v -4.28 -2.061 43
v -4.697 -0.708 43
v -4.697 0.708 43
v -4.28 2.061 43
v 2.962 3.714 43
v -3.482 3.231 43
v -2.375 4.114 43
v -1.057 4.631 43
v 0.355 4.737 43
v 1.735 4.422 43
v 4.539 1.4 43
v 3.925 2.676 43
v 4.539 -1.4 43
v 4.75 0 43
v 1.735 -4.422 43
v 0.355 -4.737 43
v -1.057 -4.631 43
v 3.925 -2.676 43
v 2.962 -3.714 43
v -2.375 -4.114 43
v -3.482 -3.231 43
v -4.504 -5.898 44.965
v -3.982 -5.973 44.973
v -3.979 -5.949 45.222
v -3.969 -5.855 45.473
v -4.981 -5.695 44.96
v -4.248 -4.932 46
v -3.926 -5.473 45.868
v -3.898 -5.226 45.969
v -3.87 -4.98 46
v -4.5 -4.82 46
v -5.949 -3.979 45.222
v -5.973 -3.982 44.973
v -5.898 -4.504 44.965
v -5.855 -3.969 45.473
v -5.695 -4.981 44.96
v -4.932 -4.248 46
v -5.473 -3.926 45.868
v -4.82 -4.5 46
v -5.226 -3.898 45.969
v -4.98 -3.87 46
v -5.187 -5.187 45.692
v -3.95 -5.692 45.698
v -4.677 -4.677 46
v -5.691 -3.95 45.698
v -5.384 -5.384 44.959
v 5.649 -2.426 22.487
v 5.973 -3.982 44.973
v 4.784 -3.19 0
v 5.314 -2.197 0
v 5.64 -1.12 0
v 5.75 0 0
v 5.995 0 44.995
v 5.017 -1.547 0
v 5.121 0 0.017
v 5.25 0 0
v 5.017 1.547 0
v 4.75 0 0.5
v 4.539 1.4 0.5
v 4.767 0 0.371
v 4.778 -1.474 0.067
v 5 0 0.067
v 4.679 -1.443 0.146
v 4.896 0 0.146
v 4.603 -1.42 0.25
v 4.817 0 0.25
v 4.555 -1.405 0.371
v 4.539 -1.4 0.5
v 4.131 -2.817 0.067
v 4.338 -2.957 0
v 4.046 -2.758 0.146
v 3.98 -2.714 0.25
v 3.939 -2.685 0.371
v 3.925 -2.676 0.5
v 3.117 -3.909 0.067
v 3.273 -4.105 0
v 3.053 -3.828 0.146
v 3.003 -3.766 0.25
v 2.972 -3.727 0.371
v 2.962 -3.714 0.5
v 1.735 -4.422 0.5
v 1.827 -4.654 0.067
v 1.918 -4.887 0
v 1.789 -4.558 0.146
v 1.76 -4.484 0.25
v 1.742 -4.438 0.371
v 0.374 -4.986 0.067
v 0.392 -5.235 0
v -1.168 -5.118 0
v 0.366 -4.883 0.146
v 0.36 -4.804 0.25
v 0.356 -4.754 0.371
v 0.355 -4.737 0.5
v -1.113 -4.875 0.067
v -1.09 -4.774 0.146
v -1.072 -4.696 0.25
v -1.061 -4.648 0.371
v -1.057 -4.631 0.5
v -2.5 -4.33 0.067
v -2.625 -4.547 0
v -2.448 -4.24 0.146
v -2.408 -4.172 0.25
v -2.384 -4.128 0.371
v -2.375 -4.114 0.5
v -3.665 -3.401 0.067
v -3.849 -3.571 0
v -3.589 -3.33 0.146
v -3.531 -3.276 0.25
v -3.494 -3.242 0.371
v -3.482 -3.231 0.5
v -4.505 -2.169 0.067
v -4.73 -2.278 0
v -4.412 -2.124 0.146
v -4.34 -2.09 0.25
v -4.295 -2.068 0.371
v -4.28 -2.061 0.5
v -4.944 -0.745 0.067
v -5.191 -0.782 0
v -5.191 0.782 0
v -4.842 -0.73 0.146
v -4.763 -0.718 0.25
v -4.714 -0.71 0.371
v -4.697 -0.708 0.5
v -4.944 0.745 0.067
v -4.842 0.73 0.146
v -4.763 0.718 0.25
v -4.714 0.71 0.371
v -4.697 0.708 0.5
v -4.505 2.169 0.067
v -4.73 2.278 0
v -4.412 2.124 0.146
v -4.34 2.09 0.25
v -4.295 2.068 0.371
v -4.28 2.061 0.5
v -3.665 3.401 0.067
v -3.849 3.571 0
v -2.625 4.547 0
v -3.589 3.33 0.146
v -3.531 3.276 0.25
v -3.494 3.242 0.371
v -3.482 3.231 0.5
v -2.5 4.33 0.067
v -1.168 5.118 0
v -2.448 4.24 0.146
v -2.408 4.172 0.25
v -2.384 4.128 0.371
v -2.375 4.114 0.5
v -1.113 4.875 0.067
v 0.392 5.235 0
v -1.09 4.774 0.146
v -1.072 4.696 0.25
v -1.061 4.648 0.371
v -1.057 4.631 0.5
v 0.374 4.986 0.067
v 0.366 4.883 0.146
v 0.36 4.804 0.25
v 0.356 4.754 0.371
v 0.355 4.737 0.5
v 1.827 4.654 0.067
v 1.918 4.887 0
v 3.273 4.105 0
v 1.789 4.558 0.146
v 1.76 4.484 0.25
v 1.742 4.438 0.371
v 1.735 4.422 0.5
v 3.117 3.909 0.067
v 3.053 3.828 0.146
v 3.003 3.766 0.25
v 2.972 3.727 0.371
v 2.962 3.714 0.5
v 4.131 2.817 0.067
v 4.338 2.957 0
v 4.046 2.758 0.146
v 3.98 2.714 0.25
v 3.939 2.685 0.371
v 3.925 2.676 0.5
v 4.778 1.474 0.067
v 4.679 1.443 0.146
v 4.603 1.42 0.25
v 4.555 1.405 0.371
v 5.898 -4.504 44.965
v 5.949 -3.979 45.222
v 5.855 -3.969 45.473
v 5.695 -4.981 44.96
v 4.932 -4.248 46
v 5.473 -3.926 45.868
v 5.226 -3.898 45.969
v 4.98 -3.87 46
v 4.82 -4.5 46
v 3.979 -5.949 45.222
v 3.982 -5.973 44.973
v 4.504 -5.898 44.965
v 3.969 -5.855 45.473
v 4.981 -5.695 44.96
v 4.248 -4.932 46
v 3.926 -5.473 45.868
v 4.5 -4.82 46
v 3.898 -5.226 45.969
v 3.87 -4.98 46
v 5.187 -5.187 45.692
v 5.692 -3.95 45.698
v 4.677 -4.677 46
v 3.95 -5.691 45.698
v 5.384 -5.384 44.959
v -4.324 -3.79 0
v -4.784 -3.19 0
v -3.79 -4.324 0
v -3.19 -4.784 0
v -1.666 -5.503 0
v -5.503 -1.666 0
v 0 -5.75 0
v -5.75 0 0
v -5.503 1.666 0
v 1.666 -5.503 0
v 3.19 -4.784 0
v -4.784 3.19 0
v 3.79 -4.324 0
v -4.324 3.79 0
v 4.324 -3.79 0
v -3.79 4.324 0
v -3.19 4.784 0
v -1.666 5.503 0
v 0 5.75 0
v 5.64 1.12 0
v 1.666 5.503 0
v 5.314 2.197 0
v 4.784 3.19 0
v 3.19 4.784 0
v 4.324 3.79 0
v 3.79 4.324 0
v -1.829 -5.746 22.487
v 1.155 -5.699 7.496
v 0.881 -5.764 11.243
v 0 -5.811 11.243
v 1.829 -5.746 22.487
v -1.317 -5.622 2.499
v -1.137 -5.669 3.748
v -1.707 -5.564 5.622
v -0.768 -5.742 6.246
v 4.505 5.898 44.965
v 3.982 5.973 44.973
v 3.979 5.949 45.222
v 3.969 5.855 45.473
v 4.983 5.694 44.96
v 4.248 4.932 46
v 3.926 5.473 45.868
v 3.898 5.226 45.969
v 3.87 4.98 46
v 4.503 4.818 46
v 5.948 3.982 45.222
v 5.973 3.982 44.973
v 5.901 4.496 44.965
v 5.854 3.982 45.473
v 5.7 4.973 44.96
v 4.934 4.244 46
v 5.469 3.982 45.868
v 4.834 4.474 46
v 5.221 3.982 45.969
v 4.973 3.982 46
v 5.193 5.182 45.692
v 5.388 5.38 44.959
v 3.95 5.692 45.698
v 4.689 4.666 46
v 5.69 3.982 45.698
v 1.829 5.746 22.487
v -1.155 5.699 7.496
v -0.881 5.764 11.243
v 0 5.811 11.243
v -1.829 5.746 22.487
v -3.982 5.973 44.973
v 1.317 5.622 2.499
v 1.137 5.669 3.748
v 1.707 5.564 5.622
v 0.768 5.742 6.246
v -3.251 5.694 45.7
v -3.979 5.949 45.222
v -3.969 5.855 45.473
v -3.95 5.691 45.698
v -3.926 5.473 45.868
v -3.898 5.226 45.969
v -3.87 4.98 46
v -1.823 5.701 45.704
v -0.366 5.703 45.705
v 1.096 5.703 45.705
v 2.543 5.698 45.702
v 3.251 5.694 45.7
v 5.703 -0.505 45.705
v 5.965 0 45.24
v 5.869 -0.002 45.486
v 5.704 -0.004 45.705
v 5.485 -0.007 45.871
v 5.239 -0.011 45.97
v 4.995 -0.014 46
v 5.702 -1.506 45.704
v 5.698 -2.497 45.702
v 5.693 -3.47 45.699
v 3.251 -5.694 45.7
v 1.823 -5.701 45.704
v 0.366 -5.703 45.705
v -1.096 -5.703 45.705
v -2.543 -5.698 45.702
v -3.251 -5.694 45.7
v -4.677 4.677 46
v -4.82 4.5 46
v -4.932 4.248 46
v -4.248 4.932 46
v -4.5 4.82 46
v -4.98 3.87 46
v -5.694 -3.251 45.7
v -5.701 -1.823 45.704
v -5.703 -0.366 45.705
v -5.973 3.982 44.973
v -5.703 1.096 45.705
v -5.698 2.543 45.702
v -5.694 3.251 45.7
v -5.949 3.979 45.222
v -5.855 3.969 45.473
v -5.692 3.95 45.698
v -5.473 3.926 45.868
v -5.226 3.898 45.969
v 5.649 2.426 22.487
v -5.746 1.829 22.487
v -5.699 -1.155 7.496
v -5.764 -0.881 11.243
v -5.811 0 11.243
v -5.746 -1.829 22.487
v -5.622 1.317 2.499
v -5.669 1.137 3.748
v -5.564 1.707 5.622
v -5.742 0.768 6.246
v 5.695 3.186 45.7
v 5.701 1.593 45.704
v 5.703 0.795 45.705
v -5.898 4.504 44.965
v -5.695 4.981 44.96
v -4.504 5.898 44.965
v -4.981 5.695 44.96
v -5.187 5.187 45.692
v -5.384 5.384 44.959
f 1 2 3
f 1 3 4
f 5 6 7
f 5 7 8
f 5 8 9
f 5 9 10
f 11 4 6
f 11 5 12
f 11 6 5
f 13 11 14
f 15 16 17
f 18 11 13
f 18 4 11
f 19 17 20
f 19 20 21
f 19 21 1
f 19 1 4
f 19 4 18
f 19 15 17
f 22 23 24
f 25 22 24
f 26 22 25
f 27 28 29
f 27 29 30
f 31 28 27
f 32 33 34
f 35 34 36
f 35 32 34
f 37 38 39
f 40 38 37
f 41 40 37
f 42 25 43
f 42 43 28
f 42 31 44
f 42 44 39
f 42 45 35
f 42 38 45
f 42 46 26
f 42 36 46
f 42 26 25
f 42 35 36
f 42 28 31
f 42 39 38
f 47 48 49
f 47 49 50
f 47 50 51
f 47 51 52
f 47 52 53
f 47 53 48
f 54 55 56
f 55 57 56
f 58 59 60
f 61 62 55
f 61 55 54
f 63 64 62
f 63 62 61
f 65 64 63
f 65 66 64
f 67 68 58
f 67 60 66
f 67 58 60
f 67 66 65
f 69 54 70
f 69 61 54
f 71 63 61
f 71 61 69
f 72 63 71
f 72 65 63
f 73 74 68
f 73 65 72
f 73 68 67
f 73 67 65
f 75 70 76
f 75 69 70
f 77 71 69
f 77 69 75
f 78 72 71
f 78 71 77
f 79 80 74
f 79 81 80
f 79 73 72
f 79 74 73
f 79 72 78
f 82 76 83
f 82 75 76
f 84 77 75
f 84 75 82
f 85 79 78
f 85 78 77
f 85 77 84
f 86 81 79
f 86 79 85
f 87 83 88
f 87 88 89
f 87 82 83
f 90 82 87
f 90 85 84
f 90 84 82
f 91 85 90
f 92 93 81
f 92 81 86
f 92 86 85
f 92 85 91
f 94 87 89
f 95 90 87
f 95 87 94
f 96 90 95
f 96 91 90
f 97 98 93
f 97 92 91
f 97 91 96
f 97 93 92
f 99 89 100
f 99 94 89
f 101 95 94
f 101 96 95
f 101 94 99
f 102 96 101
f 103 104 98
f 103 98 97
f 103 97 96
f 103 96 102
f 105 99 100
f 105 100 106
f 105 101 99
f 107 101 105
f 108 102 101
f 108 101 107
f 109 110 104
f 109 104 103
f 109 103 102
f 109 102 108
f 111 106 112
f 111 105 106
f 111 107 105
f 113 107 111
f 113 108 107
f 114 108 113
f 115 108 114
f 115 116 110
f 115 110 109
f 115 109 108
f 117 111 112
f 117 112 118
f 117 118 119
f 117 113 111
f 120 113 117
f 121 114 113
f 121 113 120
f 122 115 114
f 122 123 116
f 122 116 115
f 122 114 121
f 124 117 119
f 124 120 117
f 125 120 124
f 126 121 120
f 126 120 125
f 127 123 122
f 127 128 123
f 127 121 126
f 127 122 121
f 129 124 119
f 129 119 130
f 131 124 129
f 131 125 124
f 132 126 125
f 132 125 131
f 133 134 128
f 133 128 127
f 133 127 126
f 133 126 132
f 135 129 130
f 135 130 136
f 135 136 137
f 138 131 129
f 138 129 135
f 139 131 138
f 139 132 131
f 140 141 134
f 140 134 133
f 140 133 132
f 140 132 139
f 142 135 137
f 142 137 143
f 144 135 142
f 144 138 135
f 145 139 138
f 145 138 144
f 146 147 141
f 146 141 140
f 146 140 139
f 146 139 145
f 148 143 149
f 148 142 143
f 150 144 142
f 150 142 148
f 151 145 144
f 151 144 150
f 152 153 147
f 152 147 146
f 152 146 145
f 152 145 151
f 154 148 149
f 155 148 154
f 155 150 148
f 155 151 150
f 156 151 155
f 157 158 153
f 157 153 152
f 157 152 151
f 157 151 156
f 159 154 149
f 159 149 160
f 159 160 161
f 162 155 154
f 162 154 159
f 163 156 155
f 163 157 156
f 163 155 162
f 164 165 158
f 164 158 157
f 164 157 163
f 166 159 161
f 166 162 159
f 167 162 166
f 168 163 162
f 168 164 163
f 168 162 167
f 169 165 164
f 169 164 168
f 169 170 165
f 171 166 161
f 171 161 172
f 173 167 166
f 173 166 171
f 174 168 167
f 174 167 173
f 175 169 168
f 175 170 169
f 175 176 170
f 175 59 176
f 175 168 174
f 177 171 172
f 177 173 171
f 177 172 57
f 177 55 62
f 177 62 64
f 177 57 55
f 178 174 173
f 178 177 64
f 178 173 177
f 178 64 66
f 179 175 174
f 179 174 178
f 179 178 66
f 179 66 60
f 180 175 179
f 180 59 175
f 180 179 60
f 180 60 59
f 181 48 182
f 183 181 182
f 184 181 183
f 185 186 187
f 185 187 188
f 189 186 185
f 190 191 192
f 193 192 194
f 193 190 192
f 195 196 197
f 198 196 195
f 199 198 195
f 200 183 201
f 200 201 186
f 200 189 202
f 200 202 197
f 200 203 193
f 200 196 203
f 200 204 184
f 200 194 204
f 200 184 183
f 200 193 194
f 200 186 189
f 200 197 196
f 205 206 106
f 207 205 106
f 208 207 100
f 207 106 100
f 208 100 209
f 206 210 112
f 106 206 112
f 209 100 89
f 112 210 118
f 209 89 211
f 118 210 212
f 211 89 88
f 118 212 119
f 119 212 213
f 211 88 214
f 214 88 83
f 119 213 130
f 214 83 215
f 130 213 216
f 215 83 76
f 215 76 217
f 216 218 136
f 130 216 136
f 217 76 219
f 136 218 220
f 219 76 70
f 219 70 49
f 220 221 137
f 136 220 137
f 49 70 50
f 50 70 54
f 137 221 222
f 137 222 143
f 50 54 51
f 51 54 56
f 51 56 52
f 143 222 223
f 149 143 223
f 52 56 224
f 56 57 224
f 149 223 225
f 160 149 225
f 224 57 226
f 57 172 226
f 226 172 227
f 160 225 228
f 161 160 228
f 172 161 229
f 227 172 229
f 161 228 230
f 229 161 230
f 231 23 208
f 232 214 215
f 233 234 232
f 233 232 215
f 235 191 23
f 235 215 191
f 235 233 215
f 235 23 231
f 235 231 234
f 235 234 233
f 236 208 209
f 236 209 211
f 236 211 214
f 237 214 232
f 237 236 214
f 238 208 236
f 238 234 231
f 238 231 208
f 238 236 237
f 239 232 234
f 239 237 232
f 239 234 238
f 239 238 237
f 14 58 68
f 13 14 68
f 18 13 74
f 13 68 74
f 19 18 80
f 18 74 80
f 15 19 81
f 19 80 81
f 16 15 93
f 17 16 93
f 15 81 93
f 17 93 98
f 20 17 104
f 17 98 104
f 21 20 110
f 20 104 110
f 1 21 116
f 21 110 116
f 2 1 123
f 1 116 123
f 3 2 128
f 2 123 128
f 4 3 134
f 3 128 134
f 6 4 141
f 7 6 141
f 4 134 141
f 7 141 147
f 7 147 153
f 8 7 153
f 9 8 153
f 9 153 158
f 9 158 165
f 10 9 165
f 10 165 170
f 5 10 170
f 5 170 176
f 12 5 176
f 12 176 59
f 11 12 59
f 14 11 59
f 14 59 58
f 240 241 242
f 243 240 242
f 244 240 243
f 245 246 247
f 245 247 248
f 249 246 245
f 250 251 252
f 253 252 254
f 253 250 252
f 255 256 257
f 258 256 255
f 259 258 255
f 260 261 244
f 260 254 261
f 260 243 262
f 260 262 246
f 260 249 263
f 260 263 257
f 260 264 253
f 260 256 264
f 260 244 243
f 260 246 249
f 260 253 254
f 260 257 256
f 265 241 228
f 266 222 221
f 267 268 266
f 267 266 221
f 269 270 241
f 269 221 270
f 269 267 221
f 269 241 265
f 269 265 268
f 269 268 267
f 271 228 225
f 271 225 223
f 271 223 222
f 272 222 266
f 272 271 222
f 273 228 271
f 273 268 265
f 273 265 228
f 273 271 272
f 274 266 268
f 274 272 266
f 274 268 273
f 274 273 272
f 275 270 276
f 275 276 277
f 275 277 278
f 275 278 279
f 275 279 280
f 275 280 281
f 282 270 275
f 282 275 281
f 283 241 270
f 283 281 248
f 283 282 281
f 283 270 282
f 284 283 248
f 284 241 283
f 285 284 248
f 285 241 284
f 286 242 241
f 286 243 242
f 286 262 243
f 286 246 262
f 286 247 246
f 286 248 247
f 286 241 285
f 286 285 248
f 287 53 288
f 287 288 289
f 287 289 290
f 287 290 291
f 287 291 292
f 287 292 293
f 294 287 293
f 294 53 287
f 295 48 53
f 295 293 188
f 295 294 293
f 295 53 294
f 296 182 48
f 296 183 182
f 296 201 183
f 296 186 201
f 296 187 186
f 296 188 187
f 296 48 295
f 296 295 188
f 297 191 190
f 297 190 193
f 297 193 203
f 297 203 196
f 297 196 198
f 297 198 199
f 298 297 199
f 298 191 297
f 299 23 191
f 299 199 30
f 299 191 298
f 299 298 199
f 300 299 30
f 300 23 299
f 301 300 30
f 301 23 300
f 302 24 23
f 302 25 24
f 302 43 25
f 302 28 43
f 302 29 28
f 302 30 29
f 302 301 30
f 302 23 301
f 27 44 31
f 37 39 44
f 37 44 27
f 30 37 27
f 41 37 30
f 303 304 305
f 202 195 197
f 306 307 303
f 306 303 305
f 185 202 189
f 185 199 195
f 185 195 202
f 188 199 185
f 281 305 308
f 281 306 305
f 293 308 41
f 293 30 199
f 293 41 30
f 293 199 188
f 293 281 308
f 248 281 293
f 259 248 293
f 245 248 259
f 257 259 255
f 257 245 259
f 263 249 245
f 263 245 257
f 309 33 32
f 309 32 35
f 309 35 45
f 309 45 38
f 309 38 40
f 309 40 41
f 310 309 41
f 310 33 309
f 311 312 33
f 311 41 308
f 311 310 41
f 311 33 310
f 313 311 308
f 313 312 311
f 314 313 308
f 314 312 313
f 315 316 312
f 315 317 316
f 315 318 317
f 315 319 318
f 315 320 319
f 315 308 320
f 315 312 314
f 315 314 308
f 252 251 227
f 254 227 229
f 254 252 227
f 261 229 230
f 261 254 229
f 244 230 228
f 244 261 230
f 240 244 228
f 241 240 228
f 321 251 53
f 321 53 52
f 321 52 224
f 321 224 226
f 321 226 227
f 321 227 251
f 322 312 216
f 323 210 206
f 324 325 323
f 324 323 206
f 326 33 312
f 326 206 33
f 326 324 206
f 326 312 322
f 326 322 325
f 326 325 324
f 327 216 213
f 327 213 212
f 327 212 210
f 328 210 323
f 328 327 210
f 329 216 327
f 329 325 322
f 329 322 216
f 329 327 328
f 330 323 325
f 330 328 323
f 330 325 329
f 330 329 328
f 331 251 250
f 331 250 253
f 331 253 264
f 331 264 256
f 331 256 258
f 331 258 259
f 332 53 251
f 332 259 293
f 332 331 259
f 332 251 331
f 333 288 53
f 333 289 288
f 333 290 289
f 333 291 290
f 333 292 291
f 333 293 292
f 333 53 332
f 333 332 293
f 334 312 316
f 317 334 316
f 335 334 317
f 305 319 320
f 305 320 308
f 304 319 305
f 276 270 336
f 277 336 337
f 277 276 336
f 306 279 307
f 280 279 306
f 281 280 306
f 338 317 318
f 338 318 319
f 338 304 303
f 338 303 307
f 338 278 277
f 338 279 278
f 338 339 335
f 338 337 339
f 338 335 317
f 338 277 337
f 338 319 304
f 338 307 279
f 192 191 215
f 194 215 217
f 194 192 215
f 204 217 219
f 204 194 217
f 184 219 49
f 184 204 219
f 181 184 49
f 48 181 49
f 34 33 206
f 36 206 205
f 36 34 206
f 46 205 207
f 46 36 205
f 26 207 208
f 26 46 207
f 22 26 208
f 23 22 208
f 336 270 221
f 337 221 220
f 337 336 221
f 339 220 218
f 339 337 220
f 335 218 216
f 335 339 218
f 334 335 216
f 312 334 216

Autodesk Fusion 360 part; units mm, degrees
sketch "Sketch3" plane through (0, 0, 0) normal (0, 0, 1) x (1, 0, 0)
  circle A0 centre (0, 0) radius 5.75
  dimension "d17" = 11.5
ref_plane "WorkPlane1" through (0, 0, 46) normal (0, 0, 1) x (1, 0, 0)
sketch "Sketch4" plane through (0, 0, 46) normal (0, 0, 1) x (1, 0, 0)
  line L0 (4, -6) -> (-4, -6)
  line L1 (-6, -4) -> (-6, 4)
  line L2 (-4, 6) -> (4, 6)
  line L3 (6, 4) -> (6, -4)
  arc A0 (-4, 6) -> (-6, 4) centre (-4, 4) ccw
  arc A1 (6, 4) -> (4, 6) centre (4, 4) ccw
  arc A2 (4, -6) -> (6, -4) centre (4, -4) ccw
  arc A3 (-6, -4) -> (-4, -6) centre (-4, -4) ccw
  point P0 (-6, -6)
  point P1 (-6, 6)
  point P2 (6, 6)
  dimension "d19" = 12
  dimension "d20" = 12
  dimension "d21" = 6
  dimension "d22" = 6
  dimension "d23" = 2
  dimension "d24" = 2
  dimension "d25" = 2
  dimension "d26" = 2
loft "Loft1" add profiles "Sketch3", "Sketch4" section 1 section 2
sketch "Sketch5" plane through (0, 0, 0) normal (0, 0, -1) x (1, 0, 0)
  circle A0 centre (0, 0) radius 4.75
  arc A1 (4.8644, 3.066) -> (4.8549, -3.081) centre (0, 0) ccw
  arc A2 (4.8549, -3.081) -> (4.8644, 3.066) centre (0, 0) ccw
  dimension "d27" = 9.5
extrude "Extrude2" cut sketch "Sketch5" against normal blind 43 contours A0
fillet "Fillet1" radius 1 2 edges at (6, 0, 46) (-6, 0, 46)
fillet "Fillet2" radius 0.5 1 edges at (-4.4286, -1.7177, 0)
sketch "Sketch1" plane through (0, 0, 0) normal (0, 1, 0) x (1, 0, 0)
  circle A0 centre (0, 0) radius 4.5
  circle A1 centre (0, 0) radius 5.5
  dimension "d1" = 9
  dimension "d2" = 11
extrude "Extrude1" [suppressed]
sketch "Sketch2" plane through (0, 0, 0) normal (0, 0, 1) x (1, 0, 0)
  line L0 (4.75, 0) -> (4.75, 43)
  line L1 (4.75, 43) -> (0, 43)
  line L2 (0, 43) -> (0, 45)
  line L3 (0, 45) -> (5.75, 45)
  line L4 (5.75, 45) -> (5.75, 0)
  line L5 (5.75, 0) -> (4.75, 0)
  dimension "d6" = 43
  dimension "d7" = 2
  dimension "d8" = 1
  dimension "d10" = 4.75
  dimension "d14" = 4.75
revolve "Revolve3" [suppressed]
chamfer "Chamfer1" [suppressed]
revolve "Revolve1" [suppressed]
revolve "Revolve2" [suppressed]
equation "d17 = ( ( ( 4.75 * 2 ) * 1 ) * 1 mm ) + 2 mm"
equation "d27 = ( 4.75 * 2 ) * 1 mm"
